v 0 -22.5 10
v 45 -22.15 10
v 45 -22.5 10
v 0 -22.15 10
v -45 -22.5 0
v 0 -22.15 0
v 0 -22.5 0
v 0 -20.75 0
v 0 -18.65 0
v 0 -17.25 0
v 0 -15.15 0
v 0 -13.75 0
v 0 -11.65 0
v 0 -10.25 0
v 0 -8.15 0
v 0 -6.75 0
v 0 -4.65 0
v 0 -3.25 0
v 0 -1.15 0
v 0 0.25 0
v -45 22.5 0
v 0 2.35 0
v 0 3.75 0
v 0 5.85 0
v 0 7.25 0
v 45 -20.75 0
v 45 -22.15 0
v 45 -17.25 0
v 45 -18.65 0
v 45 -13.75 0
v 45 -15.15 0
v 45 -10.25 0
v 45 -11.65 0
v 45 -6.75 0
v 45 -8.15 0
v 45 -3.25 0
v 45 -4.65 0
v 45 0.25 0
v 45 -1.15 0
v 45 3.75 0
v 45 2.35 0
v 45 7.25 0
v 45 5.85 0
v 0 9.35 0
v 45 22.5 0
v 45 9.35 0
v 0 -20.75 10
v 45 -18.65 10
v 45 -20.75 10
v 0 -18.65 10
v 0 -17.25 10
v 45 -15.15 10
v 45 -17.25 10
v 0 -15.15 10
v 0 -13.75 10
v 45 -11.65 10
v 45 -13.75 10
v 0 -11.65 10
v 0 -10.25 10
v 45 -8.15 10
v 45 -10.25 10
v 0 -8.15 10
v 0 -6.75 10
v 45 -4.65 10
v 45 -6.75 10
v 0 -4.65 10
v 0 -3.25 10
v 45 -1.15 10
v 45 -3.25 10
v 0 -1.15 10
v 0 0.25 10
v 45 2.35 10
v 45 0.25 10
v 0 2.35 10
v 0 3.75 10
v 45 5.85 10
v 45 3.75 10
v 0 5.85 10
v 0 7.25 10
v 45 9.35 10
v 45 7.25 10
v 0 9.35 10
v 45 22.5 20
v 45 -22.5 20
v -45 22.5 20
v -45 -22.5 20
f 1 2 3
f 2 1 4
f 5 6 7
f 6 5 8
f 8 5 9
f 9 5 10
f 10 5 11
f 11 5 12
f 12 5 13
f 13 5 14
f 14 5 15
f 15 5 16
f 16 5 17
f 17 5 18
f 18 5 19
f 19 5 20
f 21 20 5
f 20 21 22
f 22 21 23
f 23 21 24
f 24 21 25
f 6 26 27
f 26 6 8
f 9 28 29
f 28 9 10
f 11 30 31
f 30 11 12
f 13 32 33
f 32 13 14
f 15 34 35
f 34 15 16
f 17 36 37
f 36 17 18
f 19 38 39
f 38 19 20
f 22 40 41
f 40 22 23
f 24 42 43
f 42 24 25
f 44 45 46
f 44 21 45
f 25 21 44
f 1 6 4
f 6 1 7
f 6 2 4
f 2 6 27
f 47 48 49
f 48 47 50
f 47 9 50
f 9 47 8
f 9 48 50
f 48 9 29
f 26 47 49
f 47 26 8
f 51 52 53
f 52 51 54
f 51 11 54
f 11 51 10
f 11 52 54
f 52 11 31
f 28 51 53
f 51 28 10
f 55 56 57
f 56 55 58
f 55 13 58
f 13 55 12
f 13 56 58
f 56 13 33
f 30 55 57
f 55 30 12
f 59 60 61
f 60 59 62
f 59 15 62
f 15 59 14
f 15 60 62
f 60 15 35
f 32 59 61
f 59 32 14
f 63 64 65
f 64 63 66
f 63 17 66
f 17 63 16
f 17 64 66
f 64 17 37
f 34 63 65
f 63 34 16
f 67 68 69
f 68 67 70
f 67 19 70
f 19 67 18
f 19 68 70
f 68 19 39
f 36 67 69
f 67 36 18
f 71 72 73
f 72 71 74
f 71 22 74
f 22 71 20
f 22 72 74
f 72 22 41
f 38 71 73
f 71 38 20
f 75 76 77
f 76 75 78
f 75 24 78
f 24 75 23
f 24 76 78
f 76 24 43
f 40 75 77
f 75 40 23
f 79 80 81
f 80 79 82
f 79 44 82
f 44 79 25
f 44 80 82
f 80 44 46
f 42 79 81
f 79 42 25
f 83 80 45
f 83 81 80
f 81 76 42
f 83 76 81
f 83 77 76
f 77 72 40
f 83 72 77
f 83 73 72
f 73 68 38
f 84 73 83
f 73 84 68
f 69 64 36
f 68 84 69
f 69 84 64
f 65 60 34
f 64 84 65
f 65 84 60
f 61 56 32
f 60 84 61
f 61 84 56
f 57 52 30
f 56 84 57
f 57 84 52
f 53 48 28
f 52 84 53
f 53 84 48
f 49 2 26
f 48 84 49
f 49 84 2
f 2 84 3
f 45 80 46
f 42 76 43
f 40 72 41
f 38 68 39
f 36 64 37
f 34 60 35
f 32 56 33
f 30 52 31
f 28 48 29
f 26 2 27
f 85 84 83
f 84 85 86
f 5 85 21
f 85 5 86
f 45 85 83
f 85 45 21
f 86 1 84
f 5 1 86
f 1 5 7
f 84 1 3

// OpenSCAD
// Drying rack for microscope slides - a solid base block with a row of parallel slots open at the
// top, so slides standing on their long edge are half immersed in water and dry upright. NOVEL
// general part (a generic "slide rack" rather than any one lab's part).
//

slides   = 10;
slide_w  = 75;
slide_h  = 25;
slide_t  = 1;
base_l   = 90;
base_w   = 45;
base_h   = 20;
slot_l   = 77;
slot_w   = 1.6;
slot_d   = 10;
pitch    = 3.5;

$fn = 48;

slot_w_eff = slot_w + 0.5;   // open the cut so it doesn't bridge between pixels

difference() {
    translate([-base_l / 2, -base_w / 2, 0]) cube([base_l, base_w, base_h]);
    for (i = [0 : slides - 1])
        translate([0, -base_w / 2 - pitch / 2 + i * pitch, 0])
            cube([slot_l, slot_w_eff, slot_d]);
}
